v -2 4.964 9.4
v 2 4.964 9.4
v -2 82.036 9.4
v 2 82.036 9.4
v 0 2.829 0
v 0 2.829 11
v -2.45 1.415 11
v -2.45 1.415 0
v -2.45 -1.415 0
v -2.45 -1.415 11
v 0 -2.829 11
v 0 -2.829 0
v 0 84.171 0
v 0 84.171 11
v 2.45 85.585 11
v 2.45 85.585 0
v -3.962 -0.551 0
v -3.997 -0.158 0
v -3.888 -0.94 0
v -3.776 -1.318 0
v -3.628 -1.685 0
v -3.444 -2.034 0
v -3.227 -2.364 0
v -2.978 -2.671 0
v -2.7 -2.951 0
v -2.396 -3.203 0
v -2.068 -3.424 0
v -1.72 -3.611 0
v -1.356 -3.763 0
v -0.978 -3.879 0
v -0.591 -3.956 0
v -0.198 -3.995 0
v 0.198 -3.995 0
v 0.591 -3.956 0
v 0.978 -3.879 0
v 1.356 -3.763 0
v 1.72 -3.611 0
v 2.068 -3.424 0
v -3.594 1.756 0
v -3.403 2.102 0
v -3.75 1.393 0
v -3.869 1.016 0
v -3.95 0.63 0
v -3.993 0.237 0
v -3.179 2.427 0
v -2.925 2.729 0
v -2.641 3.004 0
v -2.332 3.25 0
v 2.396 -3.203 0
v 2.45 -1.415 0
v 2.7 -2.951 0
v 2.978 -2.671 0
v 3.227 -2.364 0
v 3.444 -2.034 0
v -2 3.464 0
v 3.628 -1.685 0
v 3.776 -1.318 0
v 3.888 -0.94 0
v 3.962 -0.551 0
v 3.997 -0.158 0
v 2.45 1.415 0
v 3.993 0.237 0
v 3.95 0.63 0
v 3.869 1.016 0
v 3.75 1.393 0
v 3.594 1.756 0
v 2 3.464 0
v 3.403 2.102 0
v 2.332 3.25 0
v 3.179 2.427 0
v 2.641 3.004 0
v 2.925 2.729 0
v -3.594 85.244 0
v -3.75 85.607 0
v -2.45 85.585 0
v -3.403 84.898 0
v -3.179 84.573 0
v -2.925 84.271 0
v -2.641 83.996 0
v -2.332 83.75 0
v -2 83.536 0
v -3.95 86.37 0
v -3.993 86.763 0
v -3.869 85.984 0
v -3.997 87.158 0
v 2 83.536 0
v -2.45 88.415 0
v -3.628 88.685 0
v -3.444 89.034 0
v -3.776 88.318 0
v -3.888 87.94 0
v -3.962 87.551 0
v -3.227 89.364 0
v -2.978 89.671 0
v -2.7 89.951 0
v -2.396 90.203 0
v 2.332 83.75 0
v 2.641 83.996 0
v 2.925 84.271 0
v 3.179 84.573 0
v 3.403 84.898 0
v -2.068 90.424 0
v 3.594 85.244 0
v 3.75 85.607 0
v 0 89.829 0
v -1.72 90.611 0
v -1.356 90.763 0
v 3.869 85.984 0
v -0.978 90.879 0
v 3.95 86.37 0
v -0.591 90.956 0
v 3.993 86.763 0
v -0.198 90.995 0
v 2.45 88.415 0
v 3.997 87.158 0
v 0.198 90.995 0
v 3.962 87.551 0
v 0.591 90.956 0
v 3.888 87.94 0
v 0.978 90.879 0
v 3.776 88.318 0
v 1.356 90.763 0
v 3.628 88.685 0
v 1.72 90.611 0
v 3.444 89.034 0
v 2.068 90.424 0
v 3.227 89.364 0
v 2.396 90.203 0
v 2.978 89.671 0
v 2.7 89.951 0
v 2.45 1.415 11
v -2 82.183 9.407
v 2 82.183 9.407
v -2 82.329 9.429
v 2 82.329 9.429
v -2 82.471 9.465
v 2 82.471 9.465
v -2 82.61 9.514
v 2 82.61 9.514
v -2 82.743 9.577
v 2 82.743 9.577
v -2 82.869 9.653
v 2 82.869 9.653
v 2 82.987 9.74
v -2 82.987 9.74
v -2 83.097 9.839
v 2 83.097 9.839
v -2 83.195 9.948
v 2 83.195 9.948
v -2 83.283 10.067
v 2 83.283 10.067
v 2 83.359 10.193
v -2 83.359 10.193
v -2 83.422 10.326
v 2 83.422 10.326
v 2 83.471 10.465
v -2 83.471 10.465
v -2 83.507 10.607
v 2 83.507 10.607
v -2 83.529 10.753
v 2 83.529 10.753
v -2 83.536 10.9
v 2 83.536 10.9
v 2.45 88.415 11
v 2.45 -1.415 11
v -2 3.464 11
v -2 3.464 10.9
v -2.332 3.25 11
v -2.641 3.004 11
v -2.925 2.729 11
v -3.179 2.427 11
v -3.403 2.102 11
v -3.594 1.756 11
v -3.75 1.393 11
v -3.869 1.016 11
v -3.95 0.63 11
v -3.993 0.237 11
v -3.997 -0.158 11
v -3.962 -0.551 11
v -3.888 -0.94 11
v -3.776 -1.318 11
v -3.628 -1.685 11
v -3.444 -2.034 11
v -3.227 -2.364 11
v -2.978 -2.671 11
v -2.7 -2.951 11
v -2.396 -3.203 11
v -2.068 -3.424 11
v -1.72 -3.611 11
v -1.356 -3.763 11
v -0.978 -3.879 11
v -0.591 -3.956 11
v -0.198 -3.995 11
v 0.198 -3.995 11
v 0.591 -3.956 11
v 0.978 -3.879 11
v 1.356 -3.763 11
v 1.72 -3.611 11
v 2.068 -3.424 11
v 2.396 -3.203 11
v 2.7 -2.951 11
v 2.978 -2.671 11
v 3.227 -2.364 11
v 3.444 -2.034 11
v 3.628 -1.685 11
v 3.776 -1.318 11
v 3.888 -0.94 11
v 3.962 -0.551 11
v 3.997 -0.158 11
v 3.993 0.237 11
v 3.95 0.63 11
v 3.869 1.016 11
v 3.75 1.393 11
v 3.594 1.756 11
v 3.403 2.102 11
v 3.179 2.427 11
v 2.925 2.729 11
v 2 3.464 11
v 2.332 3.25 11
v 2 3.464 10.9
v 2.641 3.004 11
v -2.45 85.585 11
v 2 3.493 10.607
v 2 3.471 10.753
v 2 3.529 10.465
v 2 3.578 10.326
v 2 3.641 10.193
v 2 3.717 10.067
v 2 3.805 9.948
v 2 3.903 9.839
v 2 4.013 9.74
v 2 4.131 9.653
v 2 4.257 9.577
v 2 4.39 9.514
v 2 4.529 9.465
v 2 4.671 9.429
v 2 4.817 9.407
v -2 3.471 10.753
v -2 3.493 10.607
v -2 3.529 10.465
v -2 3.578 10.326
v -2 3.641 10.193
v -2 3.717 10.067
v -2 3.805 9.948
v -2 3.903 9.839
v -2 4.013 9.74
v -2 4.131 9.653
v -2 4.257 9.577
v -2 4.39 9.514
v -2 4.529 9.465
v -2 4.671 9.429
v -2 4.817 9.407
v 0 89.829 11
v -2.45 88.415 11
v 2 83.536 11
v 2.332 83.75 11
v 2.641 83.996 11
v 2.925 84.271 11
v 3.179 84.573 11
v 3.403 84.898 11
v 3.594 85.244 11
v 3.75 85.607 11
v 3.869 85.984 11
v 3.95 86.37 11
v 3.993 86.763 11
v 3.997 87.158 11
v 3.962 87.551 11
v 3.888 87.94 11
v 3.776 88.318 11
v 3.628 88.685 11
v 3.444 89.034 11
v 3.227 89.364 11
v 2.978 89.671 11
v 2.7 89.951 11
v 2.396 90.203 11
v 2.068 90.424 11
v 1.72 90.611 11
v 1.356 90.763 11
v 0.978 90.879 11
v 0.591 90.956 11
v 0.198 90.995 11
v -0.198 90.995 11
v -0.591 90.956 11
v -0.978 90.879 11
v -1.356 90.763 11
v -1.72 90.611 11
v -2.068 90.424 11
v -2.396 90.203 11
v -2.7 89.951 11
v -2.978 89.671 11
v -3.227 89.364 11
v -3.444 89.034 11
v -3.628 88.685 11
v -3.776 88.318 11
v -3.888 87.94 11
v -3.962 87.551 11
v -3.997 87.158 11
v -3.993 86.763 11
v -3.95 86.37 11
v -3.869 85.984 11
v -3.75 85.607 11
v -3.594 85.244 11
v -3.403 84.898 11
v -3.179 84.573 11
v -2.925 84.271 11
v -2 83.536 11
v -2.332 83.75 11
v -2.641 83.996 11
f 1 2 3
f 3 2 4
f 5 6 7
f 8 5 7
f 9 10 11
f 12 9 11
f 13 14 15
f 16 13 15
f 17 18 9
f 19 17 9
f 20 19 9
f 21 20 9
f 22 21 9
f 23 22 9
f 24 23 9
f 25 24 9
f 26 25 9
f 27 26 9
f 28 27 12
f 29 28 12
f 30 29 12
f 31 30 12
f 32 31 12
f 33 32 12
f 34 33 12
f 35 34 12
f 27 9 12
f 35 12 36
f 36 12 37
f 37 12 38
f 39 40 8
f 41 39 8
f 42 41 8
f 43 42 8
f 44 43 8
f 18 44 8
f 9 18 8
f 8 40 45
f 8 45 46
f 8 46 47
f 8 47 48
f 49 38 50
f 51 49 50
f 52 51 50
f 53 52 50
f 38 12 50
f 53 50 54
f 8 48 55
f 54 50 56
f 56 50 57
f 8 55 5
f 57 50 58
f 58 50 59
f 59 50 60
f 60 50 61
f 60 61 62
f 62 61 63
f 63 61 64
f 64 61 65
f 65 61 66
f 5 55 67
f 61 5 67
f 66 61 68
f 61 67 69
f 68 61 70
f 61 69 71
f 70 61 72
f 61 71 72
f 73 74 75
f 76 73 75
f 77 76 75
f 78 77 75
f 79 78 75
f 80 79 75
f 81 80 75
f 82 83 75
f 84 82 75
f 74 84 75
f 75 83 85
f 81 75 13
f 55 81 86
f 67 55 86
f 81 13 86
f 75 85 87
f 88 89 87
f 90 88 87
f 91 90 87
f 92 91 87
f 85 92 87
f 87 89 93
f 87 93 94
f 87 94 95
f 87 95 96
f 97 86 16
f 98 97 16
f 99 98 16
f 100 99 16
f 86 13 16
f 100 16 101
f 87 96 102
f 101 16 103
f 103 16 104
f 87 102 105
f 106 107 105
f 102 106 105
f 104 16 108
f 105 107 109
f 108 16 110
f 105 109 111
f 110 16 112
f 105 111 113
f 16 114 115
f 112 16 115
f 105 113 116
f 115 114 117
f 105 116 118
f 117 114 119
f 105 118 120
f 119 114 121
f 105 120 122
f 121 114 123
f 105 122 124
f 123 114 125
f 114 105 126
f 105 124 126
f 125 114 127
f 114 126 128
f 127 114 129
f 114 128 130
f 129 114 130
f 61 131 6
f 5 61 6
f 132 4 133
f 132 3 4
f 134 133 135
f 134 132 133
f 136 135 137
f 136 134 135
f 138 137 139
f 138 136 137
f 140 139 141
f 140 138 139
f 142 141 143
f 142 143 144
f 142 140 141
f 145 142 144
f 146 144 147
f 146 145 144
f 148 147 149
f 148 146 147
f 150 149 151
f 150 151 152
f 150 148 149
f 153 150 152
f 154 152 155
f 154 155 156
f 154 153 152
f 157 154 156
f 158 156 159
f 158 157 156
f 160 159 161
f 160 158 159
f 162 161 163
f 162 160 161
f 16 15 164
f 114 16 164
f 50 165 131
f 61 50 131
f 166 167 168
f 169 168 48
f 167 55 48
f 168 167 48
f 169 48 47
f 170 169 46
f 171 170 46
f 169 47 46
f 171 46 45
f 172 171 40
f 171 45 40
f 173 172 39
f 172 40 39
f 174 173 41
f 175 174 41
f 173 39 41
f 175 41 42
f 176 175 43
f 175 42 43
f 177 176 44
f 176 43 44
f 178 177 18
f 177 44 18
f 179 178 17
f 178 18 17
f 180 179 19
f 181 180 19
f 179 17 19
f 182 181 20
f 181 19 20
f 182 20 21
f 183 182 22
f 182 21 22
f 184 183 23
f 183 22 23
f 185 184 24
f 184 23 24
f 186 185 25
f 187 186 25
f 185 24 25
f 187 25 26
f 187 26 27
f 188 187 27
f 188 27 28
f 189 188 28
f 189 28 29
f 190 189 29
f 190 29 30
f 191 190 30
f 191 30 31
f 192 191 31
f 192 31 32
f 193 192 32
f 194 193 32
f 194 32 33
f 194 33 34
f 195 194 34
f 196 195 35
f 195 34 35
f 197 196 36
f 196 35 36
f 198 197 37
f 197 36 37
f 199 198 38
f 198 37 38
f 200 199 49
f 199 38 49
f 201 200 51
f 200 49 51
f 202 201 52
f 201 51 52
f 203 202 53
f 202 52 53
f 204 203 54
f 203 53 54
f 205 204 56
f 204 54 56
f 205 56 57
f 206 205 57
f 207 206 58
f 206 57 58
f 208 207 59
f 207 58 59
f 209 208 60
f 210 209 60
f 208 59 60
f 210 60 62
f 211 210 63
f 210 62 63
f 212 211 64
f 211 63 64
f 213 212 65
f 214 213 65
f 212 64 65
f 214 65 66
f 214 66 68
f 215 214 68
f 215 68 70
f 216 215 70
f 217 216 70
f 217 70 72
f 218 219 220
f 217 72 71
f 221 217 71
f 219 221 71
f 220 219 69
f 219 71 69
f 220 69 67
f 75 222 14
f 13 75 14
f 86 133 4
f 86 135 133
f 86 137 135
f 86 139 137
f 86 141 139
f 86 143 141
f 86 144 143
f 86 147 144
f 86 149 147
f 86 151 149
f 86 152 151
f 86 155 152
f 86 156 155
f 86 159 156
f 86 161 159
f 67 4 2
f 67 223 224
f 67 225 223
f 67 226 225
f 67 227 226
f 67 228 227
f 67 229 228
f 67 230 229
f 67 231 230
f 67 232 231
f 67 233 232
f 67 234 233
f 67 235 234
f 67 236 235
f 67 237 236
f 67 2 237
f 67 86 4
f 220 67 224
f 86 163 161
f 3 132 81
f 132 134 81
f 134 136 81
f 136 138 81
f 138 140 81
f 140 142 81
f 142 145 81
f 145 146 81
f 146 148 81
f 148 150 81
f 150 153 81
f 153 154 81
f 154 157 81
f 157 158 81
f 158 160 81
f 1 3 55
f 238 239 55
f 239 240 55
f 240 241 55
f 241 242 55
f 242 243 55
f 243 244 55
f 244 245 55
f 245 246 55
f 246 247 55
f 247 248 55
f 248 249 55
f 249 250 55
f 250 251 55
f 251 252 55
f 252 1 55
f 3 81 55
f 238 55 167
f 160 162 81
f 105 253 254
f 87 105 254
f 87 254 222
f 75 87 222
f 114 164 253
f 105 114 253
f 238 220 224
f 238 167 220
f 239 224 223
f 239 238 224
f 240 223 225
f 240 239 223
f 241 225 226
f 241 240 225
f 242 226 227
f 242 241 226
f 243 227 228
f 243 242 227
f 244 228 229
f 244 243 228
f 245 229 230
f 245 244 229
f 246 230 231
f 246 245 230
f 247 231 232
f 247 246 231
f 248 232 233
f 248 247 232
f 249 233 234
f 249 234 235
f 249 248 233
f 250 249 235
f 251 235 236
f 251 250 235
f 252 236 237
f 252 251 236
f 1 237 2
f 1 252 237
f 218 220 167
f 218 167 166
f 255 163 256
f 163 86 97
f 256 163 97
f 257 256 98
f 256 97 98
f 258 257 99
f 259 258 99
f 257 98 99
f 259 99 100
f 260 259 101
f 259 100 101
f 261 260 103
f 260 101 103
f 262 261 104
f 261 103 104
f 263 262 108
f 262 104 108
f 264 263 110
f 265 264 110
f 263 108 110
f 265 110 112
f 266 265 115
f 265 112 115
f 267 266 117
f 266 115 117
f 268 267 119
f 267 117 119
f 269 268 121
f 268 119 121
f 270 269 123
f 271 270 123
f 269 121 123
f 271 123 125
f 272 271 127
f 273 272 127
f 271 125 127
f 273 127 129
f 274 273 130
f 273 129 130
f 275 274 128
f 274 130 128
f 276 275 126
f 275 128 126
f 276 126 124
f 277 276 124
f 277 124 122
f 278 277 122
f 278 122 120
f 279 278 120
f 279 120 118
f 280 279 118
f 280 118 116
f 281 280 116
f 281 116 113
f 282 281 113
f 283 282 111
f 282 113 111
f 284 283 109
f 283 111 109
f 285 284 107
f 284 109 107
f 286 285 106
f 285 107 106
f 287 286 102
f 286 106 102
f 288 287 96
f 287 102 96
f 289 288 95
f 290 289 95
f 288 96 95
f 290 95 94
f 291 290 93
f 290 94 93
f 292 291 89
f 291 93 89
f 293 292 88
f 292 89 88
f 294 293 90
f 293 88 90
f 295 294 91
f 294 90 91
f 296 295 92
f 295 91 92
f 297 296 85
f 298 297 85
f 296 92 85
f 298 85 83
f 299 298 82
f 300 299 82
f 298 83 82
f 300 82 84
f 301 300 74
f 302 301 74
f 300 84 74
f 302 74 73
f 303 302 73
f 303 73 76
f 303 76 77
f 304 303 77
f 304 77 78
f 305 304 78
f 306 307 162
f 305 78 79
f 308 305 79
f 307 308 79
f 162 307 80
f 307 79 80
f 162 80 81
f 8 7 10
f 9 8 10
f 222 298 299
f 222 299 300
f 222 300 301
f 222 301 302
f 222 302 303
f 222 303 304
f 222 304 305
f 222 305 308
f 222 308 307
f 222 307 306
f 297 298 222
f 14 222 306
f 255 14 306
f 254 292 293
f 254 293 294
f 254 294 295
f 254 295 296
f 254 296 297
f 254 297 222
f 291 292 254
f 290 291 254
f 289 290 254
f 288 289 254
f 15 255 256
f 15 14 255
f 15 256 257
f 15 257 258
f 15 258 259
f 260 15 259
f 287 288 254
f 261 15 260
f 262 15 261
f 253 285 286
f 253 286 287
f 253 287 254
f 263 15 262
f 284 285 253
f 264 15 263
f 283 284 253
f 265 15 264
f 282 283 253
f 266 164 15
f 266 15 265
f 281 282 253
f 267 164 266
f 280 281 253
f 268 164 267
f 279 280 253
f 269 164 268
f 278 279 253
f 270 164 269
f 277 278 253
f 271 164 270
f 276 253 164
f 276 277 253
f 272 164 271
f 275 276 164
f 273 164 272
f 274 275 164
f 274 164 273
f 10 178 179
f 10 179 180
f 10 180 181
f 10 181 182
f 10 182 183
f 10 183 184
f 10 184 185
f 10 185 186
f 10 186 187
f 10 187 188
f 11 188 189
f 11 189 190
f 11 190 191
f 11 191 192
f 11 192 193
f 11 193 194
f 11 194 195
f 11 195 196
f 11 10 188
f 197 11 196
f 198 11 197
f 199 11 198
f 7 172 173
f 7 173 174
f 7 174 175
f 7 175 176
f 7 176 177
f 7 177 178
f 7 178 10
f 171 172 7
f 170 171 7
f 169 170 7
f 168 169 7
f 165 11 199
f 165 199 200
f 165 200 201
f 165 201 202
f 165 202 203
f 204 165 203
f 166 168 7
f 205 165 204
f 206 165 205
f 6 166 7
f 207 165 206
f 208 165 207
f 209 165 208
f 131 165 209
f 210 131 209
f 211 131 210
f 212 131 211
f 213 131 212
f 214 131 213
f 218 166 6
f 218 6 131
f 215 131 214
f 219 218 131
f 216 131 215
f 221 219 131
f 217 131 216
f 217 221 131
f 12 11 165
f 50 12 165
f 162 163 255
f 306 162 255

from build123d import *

# Parameters (mm, degrees)
PAD_DEPTH       = 11
POCKET_DEPTH    = 11.001
SKETCH002_W     = 80.071796
SKETCH002_H     = 1.6
POCKET001_DEPTH = 6.001
FILLET_R        = 1.5
FILLET001_R     = 1.5


with BuildPart() as part:
    # Sketch → Pad (new body)
    with BuildSketch(Plane.XY):
        with BuildLine():
            ThreePointArc((-2, 3.464102), (0, -4), (2, 3.464102))
            Line((2, 83.535898), (2, 3.464102))
            ThreePointArc((2, 83.535898), (0, 91), (-2, 83.535898))
            Line((-2, 83.535898), (-2, 3.464102))
        make_face()
    extrude(amount=PAD_DEPTH)

    # Sketch001 (on Face6 of Pad) → Pocket (cut, through all)
    with BuildSketch(Plane.XY.offset(11)):
        Polygon((2.45, 85.585492), (2.45, 88.414508), (0, 89.829016), (-2.45, 88.414508), (-2.45, 85.585492), (0, 84.170984), align=None)
        Polygon((2.45, -1.414508), (2.45, 1.414508), (0, 2.829016), (-2.45, 1.414508), (-2.45, -1.414508), (0, -2.829016), align=None)
    extrude(amount=-POCKET_DEPTH, mode=Mode.SUBTRACT)

    # Sketch002 (on Face2 of Pocket) → Pocket001 (cut, through all)
    with BuildSketch(Plane.YZ.offset(2)):
        with Locations((43.5, 10.2)):
            Rectangle(SKETCH002_W, SKETCH002_H)
    extrude(amount=-POCKET001_DEPTH, mode=Mode.SUBTRACT)

    # Fillet
    fillet_edges = [part.edges().sort_by_distance(p)[0] for p in [
        (0, 83.535898, 9.4),
    ]]
    fillet(fillet_edges, radius=FILLET_R)

    # Fillet001
    fillet001_edges = [part.edges().sort_by_distance(p)[0] for p in [
        (0, 3.464102, 9.4),
    ]]
    fillet(fillet001_edges, radius=FILLET001_R)


solid = part.part
